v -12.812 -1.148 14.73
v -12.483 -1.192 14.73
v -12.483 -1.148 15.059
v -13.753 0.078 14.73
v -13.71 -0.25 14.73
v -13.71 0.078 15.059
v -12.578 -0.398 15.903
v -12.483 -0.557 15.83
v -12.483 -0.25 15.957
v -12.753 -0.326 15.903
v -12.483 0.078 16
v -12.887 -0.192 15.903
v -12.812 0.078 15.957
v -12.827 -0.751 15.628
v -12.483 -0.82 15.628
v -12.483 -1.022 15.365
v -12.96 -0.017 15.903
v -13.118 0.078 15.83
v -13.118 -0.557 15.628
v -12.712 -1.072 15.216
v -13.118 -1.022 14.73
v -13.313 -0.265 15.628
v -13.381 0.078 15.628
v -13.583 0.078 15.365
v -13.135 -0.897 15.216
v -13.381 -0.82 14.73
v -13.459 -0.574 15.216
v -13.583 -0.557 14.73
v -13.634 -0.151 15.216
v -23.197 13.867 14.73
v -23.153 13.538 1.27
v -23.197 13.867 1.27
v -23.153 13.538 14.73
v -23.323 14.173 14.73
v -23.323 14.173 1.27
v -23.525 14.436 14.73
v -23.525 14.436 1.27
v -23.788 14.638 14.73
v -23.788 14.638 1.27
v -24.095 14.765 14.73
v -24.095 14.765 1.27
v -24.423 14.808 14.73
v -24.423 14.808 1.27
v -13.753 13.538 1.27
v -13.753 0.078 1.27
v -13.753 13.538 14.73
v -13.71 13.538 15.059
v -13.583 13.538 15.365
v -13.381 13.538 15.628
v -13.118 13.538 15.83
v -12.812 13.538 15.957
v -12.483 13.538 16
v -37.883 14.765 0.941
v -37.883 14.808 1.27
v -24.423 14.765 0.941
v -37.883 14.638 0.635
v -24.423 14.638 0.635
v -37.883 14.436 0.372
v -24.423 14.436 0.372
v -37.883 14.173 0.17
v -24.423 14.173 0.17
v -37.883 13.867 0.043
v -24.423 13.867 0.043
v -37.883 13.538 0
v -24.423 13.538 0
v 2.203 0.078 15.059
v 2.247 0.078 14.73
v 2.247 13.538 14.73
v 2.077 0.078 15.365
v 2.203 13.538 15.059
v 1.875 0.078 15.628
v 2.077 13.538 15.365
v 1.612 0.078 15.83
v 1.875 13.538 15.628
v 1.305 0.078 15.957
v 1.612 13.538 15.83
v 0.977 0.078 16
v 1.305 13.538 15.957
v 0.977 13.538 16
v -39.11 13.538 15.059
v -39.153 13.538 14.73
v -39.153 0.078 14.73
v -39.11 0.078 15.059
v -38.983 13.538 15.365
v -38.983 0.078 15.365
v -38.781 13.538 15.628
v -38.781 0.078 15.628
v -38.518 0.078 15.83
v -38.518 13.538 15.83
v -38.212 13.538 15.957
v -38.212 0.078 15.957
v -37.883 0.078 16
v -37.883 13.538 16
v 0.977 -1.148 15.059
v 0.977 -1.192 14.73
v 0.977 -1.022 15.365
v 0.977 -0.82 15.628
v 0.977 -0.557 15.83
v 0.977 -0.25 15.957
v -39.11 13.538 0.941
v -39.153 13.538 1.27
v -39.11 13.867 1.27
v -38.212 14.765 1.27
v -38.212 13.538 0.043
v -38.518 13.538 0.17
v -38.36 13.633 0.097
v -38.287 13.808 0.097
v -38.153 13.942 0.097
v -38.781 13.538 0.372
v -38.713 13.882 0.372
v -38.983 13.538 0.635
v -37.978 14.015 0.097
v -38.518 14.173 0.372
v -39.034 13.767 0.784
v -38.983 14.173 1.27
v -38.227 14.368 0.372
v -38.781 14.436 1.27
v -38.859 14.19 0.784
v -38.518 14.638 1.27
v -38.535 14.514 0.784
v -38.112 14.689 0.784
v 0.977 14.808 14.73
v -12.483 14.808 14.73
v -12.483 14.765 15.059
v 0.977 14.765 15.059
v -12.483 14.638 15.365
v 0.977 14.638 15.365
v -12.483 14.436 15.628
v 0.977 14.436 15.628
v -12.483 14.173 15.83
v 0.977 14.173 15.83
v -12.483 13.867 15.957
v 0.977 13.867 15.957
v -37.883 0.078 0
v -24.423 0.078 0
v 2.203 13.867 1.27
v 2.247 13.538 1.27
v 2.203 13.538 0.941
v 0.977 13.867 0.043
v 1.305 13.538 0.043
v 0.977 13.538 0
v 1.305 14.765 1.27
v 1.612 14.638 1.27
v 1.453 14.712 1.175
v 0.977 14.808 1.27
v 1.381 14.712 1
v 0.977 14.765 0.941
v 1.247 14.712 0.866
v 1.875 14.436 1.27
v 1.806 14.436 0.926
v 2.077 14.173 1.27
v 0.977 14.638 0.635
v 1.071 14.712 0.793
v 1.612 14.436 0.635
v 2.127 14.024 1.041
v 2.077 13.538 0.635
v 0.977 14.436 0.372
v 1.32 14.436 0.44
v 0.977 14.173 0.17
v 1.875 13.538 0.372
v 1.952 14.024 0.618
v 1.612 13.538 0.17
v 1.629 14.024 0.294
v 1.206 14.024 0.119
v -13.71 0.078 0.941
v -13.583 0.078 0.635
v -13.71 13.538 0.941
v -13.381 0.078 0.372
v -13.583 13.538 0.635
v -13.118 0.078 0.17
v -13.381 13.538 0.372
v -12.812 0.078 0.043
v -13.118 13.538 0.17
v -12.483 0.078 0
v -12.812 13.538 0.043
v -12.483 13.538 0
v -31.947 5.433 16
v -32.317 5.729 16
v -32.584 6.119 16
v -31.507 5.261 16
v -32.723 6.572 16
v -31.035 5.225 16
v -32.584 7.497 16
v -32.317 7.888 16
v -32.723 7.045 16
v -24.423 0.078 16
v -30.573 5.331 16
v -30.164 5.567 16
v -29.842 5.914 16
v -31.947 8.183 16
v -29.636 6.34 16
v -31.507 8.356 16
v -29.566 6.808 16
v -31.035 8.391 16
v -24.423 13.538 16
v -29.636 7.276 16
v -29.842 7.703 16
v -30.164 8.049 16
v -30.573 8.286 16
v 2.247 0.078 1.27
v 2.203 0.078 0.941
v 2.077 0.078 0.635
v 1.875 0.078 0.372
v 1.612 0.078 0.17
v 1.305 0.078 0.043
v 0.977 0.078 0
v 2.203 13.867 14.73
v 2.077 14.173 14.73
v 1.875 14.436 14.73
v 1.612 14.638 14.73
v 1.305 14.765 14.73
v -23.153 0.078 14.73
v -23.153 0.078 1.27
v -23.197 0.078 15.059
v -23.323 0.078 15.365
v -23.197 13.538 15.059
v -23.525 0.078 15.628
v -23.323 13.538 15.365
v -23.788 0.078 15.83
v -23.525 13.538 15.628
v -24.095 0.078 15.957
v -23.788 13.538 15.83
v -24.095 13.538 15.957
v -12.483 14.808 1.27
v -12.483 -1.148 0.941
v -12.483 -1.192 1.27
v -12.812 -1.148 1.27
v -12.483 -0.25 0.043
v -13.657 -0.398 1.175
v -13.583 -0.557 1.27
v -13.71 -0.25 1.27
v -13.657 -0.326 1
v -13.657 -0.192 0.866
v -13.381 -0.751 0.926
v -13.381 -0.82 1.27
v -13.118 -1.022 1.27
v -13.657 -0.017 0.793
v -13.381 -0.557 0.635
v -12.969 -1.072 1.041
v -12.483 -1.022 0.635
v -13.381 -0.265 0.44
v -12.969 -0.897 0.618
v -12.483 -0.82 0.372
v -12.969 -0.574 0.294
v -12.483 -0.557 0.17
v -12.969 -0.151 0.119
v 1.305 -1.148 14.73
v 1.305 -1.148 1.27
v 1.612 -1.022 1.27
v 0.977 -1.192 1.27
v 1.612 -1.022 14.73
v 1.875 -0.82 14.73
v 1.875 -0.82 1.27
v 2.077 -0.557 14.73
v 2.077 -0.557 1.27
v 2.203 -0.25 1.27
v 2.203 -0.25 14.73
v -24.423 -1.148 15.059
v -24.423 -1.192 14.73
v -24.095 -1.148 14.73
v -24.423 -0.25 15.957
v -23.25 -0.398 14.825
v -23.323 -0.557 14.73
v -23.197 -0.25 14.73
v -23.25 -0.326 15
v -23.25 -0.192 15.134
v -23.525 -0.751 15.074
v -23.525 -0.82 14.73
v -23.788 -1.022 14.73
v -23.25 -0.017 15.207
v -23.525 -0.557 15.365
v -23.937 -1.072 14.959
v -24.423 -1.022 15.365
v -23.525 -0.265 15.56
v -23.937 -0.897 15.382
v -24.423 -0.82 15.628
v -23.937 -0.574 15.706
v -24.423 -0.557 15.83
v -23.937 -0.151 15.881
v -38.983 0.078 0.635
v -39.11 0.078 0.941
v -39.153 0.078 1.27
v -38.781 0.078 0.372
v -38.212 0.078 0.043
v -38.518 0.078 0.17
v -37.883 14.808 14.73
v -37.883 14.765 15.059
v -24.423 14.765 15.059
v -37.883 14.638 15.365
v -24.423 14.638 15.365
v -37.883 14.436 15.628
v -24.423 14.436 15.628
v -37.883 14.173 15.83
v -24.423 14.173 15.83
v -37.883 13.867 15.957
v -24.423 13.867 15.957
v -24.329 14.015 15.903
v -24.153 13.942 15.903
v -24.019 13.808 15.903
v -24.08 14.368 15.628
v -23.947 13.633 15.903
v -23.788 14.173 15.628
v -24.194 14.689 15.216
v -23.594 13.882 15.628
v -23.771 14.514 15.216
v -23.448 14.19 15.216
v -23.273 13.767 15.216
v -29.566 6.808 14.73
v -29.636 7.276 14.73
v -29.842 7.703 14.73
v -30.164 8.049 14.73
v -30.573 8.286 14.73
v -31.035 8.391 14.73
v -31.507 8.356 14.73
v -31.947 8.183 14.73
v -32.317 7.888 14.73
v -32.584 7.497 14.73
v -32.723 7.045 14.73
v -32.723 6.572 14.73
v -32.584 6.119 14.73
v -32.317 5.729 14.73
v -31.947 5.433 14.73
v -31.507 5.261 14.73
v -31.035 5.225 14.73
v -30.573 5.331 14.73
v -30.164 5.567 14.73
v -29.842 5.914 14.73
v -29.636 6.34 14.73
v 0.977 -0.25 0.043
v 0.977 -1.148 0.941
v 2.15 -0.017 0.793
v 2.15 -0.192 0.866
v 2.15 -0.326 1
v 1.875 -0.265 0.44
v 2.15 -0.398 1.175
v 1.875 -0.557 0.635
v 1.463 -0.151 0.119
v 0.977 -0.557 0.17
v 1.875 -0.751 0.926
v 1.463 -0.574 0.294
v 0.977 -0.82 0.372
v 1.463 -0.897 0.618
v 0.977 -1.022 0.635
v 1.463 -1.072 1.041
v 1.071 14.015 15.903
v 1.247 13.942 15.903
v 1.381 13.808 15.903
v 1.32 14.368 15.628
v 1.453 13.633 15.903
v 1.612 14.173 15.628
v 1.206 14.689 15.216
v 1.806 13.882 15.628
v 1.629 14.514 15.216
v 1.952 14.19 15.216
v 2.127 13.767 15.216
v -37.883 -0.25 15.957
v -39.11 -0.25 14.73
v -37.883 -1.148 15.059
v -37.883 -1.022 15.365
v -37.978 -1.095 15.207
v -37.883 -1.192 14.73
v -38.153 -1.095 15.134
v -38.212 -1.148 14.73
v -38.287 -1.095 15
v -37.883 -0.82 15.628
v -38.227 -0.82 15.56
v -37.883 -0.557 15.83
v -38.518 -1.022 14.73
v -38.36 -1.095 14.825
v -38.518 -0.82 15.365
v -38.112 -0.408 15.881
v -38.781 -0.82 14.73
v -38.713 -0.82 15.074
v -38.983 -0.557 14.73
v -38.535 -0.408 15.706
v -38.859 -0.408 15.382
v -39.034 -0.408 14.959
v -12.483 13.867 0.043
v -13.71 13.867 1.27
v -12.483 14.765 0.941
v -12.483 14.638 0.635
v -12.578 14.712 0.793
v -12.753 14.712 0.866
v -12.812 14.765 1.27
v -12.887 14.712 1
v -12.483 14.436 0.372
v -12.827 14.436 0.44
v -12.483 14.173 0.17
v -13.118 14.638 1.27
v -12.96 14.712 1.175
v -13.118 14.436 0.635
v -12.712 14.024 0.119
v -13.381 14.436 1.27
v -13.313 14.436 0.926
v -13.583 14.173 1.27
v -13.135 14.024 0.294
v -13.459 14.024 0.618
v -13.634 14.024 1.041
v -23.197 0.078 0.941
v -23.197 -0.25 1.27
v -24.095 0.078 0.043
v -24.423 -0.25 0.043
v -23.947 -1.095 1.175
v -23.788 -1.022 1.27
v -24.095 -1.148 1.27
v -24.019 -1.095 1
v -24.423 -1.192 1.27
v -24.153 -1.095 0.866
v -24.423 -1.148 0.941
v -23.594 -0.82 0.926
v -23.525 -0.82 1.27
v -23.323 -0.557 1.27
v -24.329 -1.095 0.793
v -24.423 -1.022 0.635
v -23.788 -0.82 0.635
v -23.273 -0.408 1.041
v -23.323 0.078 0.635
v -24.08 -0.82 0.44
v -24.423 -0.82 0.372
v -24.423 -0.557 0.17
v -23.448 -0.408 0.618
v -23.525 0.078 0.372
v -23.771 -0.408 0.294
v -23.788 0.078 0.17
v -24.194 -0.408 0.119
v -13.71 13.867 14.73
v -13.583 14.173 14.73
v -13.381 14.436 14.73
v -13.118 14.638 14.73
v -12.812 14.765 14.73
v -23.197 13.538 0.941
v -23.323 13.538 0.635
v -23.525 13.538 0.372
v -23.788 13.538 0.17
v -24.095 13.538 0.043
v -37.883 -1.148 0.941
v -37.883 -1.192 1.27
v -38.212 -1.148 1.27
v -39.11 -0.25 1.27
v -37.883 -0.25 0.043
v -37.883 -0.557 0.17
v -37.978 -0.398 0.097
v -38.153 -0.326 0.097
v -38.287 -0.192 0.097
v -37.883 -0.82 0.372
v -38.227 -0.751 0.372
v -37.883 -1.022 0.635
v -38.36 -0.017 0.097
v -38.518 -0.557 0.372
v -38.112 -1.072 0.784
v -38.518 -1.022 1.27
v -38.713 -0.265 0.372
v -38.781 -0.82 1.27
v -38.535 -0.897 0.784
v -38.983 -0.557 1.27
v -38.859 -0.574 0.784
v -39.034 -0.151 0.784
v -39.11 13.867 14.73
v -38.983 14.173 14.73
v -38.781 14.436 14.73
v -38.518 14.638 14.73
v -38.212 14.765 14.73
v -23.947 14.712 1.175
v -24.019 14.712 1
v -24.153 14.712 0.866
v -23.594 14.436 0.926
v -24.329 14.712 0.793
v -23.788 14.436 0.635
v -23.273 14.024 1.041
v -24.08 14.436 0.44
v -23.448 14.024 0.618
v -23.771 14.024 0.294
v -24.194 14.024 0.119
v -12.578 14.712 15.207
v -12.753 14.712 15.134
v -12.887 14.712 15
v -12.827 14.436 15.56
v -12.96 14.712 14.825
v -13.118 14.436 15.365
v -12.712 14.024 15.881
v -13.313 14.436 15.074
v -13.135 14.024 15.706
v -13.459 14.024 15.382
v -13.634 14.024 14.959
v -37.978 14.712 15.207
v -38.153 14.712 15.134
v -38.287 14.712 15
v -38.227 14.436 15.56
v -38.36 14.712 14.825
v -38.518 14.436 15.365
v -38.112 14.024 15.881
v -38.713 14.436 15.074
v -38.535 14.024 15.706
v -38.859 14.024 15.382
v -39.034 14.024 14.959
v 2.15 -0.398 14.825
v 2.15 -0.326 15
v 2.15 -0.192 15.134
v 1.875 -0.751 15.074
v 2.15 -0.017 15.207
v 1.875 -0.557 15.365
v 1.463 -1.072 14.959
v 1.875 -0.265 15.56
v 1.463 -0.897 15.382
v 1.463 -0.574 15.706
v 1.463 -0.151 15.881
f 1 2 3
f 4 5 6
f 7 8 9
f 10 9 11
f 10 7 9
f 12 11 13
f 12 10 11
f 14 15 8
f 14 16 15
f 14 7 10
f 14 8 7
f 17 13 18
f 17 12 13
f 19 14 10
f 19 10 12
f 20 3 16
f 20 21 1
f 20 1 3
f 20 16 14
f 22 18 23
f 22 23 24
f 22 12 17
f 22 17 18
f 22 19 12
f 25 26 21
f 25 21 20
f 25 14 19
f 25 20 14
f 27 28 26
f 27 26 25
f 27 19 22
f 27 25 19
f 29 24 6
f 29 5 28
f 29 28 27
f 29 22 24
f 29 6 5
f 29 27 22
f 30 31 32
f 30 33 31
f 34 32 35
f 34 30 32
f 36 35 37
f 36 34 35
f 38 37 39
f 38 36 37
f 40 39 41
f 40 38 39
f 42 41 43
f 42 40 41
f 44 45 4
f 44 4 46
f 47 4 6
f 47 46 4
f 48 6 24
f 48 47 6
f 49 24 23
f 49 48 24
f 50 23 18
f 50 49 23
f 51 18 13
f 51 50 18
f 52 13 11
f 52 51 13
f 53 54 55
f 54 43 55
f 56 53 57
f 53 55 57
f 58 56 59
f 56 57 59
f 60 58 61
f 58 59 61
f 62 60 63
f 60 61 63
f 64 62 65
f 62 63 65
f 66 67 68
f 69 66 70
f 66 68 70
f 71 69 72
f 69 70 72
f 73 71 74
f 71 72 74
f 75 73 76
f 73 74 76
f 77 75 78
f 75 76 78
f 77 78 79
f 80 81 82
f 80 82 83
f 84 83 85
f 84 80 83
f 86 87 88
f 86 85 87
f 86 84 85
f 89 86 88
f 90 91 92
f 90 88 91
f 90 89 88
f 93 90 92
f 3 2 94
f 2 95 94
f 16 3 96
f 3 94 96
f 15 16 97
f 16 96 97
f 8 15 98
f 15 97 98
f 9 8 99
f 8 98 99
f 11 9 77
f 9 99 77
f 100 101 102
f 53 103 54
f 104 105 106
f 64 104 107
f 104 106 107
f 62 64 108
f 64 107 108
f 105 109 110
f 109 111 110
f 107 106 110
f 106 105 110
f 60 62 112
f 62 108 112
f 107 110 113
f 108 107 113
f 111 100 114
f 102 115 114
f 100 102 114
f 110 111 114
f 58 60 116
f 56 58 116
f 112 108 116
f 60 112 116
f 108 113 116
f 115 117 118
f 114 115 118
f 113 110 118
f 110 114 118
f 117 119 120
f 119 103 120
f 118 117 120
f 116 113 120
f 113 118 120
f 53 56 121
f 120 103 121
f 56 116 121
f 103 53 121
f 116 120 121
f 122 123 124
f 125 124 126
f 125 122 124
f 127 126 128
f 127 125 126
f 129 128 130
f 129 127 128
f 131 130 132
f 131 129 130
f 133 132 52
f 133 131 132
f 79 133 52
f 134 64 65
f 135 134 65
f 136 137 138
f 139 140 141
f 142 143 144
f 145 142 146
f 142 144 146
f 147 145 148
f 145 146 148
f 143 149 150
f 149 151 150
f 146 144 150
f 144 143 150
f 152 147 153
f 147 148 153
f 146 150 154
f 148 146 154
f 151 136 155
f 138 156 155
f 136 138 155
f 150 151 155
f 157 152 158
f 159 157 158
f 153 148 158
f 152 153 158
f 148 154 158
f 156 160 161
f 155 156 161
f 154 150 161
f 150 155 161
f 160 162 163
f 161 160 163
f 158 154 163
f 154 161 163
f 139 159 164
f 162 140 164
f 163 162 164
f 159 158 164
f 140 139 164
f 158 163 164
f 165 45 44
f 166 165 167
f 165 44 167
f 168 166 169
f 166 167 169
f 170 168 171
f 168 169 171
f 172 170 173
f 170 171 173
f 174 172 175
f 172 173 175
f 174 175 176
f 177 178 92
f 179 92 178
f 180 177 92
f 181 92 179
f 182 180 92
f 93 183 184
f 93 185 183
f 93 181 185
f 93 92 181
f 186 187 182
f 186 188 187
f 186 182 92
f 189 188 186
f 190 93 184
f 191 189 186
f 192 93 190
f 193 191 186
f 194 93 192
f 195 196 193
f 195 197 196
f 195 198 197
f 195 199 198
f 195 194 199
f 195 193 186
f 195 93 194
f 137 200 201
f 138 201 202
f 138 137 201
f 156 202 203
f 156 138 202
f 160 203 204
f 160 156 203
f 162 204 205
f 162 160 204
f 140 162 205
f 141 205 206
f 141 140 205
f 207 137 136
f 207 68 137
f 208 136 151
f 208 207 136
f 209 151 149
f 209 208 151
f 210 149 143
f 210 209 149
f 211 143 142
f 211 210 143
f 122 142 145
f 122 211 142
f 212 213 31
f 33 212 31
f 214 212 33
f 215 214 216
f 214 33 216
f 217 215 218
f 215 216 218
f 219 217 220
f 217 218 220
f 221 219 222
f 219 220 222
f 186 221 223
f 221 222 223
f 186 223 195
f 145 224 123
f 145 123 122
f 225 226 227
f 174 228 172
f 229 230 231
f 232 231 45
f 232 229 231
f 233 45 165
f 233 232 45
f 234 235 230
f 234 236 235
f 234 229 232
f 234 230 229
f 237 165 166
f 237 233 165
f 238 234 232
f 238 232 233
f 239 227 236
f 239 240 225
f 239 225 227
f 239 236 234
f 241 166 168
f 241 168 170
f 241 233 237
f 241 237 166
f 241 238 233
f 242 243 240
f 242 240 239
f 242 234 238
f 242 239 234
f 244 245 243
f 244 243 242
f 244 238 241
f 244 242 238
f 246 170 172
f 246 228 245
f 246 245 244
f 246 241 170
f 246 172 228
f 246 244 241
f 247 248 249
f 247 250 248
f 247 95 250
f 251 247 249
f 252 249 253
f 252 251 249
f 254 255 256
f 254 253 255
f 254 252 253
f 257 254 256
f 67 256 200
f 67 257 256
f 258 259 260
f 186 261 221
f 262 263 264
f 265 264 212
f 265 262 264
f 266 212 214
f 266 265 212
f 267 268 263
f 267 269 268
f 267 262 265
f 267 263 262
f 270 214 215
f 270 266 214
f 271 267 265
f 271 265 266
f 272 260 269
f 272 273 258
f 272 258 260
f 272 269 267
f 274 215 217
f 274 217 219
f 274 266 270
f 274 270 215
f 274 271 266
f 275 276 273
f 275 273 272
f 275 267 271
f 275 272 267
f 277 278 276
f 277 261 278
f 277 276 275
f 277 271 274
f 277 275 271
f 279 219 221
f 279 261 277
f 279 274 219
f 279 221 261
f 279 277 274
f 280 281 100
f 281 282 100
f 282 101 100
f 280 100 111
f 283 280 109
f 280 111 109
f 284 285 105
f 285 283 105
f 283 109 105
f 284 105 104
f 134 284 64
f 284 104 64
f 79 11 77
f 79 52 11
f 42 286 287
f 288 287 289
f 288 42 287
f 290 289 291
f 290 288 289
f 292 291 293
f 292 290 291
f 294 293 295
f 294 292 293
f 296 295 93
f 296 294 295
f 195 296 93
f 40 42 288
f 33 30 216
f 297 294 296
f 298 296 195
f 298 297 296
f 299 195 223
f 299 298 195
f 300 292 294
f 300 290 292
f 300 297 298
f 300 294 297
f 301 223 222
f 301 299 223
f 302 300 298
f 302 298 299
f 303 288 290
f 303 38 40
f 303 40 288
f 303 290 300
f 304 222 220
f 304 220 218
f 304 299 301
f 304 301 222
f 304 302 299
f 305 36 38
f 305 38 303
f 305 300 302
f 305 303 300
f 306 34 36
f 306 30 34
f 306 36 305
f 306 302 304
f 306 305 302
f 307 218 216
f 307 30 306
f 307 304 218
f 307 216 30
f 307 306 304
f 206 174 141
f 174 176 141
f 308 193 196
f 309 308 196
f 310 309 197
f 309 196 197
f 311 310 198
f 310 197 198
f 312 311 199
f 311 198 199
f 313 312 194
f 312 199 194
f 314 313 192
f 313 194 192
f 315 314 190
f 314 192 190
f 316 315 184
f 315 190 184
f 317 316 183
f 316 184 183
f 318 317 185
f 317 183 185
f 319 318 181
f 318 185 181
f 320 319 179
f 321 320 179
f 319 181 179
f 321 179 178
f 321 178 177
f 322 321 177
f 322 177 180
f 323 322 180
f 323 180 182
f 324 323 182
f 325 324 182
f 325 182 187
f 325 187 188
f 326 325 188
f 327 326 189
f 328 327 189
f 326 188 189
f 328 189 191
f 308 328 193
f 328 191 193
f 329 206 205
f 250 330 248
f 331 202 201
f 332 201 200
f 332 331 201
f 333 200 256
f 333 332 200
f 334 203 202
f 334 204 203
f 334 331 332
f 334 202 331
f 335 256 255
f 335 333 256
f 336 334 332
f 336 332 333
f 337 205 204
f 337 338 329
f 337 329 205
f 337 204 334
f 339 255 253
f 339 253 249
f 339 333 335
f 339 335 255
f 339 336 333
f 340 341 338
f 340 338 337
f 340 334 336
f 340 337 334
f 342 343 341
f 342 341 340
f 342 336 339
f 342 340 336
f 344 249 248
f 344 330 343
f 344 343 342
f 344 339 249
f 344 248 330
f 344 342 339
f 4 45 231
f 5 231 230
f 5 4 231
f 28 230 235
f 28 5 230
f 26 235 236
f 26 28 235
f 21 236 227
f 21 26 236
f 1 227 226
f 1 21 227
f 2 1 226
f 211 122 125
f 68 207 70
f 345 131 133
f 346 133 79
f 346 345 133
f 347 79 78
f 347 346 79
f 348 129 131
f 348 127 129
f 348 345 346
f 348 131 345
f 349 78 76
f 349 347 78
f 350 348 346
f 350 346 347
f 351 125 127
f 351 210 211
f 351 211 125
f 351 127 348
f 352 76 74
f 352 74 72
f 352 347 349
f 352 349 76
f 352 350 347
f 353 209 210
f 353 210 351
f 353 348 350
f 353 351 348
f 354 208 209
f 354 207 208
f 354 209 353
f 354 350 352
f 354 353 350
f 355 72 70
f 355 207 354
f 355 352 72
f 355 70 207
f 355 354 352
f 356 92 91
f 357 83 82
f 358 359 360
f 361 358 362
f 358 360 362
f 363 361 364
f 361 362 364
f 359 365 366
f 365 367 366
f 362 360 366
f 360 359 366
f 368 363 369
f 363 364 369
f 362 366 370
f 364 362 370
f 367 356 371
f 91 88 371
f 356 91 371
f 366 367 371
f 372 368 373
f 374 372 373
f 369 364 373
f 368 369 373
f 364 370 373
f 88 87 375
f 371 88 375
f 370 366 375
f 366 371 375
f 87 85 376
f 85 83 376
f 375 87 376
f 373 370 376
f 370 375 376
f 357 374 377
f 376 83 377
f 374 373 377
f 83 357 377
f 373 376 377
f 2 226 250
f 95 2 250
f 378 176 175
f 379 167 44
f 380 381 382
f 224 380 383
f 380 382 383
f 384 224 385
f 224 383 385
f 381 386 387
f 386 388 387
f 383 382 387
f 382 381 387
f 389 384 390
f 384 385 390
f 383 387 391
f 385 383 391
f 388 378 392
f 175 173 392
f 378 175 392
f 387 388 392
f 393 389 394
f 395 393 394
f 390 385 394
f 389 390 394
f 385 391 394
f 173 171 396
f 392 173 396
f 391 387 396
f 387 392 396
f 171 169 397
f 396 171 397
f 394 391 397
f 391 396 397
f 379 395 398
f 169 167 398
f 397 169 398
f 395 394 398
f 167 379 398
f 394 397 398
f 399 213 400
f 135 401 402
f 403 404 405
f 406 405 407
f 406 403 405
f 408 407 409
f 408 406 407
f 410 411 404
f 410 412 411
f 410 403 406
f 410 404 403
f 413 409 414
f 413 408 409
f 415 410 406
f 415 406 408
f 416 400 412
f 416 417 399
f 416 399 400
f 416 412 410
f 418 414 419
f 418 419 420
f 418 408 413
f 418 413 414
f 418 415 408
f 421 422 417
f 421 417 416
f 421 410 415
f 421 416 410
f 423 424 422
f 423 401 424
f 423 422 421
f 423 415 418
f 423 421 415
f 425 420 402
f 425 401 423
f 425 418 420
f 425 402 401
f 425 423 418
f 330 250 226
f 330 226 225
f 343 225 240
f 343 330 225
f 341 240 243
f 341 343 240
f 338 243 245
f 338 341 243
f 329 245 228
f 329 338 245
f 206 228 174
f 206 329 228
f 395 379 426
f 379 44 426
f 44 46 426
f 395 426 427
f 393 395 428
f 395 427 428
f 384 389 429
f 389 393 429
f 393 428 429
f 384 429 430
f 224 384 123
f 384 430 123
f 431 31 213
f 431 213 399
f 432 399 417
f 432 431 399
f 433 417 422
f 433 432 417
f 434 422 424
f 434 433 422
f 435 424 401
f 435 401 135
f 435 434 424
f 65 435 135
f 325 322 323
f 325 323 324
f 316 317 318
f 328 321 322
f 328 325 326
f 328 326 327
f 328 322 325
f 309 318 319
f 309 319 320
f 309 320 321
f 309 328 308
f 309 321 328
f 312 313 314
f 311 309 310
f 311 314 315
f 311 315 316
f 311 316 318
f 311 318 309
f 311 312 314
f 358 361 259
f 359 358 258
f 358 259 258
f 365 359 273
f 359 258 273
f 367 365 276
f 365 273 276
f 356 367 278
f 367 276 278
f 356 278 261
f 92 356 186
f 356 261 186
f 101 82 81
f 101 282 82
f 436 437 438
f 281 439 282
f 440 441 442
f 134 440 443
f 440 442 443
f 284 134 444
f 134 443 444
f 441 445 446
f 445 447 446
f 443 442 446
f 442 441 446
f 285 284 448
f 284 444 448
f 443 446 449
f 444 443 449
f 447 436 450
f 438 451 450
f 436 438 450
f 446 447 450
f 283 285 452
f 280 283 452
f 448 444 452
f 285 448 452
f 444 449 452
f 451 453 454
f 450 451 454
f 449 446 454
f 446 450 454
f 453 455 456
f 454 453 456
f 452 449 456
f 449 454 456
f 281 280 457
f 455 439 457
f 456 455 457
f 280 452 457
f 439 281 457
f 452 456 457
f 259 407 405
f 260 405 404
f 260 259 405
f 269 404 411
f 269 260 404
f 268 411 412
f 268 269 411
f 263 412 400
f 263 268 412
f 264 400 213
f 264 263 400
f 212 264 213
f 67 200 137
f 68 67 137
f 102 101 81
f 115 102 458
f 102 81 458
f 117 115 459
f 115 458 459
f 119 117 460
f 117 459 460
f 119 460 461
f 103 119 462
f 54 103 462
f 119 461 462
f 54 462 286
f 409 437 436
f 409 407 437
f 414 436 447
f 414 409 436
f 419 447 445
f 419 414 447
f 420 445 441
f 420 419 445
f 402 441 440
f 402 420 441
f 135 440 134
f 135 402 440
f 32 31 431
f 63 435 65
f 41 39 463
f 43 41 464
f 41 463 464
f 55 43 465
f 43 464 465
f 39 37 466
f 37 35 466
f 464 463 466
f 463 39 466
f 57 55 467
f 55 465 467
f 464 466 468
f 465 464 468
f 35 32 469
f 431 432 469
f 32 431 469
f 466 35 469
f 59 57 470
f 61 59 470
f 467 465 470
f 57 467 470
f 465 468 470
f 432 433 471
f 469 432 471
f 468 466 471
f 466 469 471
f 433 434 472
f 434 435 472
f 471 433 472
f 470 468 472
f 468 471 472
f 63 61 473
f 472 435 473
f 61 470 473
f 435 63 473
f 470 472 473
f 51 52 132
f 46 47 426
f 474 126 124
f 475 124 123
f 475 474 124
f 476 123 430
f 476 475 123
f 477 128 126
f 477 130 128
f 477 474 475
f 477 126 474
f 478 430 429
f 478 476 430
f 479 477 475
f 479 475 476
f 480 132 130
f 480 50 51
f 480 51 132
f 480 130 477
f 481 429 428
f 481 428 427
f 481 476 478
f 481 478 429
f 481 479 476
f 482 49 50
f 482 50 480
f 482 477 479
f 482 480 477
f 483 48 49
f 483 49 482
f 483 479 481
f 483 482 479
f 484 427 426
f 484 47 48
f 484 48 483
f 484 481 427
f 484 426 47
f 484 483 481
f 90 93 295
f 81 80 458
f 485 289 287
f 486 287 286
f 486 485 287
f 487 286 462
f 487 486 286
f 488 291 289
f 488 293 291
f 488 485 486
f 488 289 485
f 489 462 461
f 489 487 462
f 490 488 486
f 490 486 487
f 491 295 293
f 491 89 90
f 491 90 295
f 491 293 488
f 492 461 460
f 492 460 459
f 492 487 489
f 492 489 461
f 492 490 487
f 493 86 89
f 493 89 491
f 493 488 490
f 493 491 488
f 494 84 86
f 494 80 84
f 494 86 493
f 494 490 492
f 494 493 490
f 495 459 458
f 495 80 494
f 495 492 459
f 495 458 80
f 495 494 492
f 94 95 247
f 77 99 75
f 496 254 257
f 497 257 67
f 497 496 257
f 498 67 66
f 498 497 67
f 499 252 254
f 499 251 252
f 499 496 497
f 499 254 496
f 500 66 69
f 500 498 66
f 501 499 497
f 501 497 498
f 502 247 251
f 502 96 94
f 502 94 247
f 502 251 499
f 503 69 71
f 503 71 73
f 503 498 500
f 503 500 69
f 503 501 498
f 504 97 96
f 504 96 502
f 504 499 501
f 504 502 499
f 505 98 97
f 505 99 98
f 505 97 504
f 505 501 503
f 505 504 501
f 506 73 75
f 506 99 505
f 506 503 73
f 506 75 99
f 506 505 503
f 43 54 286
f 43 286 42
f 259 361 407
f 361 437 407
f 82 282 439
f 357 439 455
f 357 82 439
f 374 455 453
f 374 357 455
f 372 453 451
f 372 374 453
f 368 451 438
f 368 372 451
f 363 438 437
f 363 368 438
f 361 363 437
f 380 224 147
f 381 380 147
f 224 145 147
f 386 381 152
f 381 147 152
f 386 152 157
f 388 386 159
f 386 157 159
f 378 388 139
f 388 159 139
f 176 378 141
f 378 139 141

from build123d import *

# Parameters (mm, degrees)
F1_W     = 16
F1_H     = 16
F2_DEPTH = 16
F3_R     = 1.27
F3_2_R   = 1.27
F4_R     = 1.5875
F5_DEPTH = 1.27


with BuildPart() as f2:
    # F1 (on Top) → F2 (new body)
    with BuildSketch(Plane.XY):
        with Locations((-31.1533497572, 6.8082849886)):
            Rectangle(F1_W, F1_H)
    extrude(amount=F2_DEPTH)

    # F3
    f3_edges = [f2.edges().sort_by_distance(p)[0] for p in [
        (-23.15335, 6.808285, 0),
        (-39.15335, 6.808285, 16),
        (-31.15335, -1.191715, 16),
        (-23.15335, 14.808285, 8),
        (-23.15335, -1.191715, 8),
        (-31.15335, 14.808285, 16),
        (-39.15335, -1.191715, 8),
        (-23.15335, 6.808285, 16),
        (-31.15335, -1.191715, 0),
        (-39.15335, 14.808285, 8),
        (-39.15335, 6.808285, 0),
        (-31.15335, 14.808285, 0),
    ]]
    fillet(f3_edges, radius=F3_R)

    # F4 (on face) → F5 (cut)
    with BuildSketch(Plane.XY.offset(16)):
        with Locations((-31.1533497572, 6.8082849886)):
            Circle(F4_R)
    extrude(amount=-F5_DEPTH, mode=Mode.SUBTRACT)


with BuildPart() as f2b:
    # F1 (on Top) → F2, piece 2 (new body)
    with BuildSketch(Plane.XY):
        with Locations((-5.7533497572, 6.8082849886)):
            Rectangle(F1_W, F1_H)
    extrude(amount=F2_DEPTH)

    # F3#2
    f3_2_edges = [f2b.edges().sort_by_distance(p)[0] for p in [
        (-5.75335, -1.191715, 0),
        (2.24665, 6.808285, 0),
        (-13.75335, -1.191715, 8),
        (-5.75335, -1.191715, 16),
        (2.24665, -1.191715, 8),
        (2.24665, 14.808285, 8),
        (-13.75335, 6.808285, 16),
        (-5.75335, 14.808285, 16),
        (2.24665, 6.808285, 16),
        (-13.75335, 6.808285, 0),
        (-5.75335, 14.808285, 0),
        (-13.75335, 14.808285, 8),
    ]]
    fillet(f3_2_edges, radius=F3_2_R)


solid = Compound([f2.part, f2b.part])
